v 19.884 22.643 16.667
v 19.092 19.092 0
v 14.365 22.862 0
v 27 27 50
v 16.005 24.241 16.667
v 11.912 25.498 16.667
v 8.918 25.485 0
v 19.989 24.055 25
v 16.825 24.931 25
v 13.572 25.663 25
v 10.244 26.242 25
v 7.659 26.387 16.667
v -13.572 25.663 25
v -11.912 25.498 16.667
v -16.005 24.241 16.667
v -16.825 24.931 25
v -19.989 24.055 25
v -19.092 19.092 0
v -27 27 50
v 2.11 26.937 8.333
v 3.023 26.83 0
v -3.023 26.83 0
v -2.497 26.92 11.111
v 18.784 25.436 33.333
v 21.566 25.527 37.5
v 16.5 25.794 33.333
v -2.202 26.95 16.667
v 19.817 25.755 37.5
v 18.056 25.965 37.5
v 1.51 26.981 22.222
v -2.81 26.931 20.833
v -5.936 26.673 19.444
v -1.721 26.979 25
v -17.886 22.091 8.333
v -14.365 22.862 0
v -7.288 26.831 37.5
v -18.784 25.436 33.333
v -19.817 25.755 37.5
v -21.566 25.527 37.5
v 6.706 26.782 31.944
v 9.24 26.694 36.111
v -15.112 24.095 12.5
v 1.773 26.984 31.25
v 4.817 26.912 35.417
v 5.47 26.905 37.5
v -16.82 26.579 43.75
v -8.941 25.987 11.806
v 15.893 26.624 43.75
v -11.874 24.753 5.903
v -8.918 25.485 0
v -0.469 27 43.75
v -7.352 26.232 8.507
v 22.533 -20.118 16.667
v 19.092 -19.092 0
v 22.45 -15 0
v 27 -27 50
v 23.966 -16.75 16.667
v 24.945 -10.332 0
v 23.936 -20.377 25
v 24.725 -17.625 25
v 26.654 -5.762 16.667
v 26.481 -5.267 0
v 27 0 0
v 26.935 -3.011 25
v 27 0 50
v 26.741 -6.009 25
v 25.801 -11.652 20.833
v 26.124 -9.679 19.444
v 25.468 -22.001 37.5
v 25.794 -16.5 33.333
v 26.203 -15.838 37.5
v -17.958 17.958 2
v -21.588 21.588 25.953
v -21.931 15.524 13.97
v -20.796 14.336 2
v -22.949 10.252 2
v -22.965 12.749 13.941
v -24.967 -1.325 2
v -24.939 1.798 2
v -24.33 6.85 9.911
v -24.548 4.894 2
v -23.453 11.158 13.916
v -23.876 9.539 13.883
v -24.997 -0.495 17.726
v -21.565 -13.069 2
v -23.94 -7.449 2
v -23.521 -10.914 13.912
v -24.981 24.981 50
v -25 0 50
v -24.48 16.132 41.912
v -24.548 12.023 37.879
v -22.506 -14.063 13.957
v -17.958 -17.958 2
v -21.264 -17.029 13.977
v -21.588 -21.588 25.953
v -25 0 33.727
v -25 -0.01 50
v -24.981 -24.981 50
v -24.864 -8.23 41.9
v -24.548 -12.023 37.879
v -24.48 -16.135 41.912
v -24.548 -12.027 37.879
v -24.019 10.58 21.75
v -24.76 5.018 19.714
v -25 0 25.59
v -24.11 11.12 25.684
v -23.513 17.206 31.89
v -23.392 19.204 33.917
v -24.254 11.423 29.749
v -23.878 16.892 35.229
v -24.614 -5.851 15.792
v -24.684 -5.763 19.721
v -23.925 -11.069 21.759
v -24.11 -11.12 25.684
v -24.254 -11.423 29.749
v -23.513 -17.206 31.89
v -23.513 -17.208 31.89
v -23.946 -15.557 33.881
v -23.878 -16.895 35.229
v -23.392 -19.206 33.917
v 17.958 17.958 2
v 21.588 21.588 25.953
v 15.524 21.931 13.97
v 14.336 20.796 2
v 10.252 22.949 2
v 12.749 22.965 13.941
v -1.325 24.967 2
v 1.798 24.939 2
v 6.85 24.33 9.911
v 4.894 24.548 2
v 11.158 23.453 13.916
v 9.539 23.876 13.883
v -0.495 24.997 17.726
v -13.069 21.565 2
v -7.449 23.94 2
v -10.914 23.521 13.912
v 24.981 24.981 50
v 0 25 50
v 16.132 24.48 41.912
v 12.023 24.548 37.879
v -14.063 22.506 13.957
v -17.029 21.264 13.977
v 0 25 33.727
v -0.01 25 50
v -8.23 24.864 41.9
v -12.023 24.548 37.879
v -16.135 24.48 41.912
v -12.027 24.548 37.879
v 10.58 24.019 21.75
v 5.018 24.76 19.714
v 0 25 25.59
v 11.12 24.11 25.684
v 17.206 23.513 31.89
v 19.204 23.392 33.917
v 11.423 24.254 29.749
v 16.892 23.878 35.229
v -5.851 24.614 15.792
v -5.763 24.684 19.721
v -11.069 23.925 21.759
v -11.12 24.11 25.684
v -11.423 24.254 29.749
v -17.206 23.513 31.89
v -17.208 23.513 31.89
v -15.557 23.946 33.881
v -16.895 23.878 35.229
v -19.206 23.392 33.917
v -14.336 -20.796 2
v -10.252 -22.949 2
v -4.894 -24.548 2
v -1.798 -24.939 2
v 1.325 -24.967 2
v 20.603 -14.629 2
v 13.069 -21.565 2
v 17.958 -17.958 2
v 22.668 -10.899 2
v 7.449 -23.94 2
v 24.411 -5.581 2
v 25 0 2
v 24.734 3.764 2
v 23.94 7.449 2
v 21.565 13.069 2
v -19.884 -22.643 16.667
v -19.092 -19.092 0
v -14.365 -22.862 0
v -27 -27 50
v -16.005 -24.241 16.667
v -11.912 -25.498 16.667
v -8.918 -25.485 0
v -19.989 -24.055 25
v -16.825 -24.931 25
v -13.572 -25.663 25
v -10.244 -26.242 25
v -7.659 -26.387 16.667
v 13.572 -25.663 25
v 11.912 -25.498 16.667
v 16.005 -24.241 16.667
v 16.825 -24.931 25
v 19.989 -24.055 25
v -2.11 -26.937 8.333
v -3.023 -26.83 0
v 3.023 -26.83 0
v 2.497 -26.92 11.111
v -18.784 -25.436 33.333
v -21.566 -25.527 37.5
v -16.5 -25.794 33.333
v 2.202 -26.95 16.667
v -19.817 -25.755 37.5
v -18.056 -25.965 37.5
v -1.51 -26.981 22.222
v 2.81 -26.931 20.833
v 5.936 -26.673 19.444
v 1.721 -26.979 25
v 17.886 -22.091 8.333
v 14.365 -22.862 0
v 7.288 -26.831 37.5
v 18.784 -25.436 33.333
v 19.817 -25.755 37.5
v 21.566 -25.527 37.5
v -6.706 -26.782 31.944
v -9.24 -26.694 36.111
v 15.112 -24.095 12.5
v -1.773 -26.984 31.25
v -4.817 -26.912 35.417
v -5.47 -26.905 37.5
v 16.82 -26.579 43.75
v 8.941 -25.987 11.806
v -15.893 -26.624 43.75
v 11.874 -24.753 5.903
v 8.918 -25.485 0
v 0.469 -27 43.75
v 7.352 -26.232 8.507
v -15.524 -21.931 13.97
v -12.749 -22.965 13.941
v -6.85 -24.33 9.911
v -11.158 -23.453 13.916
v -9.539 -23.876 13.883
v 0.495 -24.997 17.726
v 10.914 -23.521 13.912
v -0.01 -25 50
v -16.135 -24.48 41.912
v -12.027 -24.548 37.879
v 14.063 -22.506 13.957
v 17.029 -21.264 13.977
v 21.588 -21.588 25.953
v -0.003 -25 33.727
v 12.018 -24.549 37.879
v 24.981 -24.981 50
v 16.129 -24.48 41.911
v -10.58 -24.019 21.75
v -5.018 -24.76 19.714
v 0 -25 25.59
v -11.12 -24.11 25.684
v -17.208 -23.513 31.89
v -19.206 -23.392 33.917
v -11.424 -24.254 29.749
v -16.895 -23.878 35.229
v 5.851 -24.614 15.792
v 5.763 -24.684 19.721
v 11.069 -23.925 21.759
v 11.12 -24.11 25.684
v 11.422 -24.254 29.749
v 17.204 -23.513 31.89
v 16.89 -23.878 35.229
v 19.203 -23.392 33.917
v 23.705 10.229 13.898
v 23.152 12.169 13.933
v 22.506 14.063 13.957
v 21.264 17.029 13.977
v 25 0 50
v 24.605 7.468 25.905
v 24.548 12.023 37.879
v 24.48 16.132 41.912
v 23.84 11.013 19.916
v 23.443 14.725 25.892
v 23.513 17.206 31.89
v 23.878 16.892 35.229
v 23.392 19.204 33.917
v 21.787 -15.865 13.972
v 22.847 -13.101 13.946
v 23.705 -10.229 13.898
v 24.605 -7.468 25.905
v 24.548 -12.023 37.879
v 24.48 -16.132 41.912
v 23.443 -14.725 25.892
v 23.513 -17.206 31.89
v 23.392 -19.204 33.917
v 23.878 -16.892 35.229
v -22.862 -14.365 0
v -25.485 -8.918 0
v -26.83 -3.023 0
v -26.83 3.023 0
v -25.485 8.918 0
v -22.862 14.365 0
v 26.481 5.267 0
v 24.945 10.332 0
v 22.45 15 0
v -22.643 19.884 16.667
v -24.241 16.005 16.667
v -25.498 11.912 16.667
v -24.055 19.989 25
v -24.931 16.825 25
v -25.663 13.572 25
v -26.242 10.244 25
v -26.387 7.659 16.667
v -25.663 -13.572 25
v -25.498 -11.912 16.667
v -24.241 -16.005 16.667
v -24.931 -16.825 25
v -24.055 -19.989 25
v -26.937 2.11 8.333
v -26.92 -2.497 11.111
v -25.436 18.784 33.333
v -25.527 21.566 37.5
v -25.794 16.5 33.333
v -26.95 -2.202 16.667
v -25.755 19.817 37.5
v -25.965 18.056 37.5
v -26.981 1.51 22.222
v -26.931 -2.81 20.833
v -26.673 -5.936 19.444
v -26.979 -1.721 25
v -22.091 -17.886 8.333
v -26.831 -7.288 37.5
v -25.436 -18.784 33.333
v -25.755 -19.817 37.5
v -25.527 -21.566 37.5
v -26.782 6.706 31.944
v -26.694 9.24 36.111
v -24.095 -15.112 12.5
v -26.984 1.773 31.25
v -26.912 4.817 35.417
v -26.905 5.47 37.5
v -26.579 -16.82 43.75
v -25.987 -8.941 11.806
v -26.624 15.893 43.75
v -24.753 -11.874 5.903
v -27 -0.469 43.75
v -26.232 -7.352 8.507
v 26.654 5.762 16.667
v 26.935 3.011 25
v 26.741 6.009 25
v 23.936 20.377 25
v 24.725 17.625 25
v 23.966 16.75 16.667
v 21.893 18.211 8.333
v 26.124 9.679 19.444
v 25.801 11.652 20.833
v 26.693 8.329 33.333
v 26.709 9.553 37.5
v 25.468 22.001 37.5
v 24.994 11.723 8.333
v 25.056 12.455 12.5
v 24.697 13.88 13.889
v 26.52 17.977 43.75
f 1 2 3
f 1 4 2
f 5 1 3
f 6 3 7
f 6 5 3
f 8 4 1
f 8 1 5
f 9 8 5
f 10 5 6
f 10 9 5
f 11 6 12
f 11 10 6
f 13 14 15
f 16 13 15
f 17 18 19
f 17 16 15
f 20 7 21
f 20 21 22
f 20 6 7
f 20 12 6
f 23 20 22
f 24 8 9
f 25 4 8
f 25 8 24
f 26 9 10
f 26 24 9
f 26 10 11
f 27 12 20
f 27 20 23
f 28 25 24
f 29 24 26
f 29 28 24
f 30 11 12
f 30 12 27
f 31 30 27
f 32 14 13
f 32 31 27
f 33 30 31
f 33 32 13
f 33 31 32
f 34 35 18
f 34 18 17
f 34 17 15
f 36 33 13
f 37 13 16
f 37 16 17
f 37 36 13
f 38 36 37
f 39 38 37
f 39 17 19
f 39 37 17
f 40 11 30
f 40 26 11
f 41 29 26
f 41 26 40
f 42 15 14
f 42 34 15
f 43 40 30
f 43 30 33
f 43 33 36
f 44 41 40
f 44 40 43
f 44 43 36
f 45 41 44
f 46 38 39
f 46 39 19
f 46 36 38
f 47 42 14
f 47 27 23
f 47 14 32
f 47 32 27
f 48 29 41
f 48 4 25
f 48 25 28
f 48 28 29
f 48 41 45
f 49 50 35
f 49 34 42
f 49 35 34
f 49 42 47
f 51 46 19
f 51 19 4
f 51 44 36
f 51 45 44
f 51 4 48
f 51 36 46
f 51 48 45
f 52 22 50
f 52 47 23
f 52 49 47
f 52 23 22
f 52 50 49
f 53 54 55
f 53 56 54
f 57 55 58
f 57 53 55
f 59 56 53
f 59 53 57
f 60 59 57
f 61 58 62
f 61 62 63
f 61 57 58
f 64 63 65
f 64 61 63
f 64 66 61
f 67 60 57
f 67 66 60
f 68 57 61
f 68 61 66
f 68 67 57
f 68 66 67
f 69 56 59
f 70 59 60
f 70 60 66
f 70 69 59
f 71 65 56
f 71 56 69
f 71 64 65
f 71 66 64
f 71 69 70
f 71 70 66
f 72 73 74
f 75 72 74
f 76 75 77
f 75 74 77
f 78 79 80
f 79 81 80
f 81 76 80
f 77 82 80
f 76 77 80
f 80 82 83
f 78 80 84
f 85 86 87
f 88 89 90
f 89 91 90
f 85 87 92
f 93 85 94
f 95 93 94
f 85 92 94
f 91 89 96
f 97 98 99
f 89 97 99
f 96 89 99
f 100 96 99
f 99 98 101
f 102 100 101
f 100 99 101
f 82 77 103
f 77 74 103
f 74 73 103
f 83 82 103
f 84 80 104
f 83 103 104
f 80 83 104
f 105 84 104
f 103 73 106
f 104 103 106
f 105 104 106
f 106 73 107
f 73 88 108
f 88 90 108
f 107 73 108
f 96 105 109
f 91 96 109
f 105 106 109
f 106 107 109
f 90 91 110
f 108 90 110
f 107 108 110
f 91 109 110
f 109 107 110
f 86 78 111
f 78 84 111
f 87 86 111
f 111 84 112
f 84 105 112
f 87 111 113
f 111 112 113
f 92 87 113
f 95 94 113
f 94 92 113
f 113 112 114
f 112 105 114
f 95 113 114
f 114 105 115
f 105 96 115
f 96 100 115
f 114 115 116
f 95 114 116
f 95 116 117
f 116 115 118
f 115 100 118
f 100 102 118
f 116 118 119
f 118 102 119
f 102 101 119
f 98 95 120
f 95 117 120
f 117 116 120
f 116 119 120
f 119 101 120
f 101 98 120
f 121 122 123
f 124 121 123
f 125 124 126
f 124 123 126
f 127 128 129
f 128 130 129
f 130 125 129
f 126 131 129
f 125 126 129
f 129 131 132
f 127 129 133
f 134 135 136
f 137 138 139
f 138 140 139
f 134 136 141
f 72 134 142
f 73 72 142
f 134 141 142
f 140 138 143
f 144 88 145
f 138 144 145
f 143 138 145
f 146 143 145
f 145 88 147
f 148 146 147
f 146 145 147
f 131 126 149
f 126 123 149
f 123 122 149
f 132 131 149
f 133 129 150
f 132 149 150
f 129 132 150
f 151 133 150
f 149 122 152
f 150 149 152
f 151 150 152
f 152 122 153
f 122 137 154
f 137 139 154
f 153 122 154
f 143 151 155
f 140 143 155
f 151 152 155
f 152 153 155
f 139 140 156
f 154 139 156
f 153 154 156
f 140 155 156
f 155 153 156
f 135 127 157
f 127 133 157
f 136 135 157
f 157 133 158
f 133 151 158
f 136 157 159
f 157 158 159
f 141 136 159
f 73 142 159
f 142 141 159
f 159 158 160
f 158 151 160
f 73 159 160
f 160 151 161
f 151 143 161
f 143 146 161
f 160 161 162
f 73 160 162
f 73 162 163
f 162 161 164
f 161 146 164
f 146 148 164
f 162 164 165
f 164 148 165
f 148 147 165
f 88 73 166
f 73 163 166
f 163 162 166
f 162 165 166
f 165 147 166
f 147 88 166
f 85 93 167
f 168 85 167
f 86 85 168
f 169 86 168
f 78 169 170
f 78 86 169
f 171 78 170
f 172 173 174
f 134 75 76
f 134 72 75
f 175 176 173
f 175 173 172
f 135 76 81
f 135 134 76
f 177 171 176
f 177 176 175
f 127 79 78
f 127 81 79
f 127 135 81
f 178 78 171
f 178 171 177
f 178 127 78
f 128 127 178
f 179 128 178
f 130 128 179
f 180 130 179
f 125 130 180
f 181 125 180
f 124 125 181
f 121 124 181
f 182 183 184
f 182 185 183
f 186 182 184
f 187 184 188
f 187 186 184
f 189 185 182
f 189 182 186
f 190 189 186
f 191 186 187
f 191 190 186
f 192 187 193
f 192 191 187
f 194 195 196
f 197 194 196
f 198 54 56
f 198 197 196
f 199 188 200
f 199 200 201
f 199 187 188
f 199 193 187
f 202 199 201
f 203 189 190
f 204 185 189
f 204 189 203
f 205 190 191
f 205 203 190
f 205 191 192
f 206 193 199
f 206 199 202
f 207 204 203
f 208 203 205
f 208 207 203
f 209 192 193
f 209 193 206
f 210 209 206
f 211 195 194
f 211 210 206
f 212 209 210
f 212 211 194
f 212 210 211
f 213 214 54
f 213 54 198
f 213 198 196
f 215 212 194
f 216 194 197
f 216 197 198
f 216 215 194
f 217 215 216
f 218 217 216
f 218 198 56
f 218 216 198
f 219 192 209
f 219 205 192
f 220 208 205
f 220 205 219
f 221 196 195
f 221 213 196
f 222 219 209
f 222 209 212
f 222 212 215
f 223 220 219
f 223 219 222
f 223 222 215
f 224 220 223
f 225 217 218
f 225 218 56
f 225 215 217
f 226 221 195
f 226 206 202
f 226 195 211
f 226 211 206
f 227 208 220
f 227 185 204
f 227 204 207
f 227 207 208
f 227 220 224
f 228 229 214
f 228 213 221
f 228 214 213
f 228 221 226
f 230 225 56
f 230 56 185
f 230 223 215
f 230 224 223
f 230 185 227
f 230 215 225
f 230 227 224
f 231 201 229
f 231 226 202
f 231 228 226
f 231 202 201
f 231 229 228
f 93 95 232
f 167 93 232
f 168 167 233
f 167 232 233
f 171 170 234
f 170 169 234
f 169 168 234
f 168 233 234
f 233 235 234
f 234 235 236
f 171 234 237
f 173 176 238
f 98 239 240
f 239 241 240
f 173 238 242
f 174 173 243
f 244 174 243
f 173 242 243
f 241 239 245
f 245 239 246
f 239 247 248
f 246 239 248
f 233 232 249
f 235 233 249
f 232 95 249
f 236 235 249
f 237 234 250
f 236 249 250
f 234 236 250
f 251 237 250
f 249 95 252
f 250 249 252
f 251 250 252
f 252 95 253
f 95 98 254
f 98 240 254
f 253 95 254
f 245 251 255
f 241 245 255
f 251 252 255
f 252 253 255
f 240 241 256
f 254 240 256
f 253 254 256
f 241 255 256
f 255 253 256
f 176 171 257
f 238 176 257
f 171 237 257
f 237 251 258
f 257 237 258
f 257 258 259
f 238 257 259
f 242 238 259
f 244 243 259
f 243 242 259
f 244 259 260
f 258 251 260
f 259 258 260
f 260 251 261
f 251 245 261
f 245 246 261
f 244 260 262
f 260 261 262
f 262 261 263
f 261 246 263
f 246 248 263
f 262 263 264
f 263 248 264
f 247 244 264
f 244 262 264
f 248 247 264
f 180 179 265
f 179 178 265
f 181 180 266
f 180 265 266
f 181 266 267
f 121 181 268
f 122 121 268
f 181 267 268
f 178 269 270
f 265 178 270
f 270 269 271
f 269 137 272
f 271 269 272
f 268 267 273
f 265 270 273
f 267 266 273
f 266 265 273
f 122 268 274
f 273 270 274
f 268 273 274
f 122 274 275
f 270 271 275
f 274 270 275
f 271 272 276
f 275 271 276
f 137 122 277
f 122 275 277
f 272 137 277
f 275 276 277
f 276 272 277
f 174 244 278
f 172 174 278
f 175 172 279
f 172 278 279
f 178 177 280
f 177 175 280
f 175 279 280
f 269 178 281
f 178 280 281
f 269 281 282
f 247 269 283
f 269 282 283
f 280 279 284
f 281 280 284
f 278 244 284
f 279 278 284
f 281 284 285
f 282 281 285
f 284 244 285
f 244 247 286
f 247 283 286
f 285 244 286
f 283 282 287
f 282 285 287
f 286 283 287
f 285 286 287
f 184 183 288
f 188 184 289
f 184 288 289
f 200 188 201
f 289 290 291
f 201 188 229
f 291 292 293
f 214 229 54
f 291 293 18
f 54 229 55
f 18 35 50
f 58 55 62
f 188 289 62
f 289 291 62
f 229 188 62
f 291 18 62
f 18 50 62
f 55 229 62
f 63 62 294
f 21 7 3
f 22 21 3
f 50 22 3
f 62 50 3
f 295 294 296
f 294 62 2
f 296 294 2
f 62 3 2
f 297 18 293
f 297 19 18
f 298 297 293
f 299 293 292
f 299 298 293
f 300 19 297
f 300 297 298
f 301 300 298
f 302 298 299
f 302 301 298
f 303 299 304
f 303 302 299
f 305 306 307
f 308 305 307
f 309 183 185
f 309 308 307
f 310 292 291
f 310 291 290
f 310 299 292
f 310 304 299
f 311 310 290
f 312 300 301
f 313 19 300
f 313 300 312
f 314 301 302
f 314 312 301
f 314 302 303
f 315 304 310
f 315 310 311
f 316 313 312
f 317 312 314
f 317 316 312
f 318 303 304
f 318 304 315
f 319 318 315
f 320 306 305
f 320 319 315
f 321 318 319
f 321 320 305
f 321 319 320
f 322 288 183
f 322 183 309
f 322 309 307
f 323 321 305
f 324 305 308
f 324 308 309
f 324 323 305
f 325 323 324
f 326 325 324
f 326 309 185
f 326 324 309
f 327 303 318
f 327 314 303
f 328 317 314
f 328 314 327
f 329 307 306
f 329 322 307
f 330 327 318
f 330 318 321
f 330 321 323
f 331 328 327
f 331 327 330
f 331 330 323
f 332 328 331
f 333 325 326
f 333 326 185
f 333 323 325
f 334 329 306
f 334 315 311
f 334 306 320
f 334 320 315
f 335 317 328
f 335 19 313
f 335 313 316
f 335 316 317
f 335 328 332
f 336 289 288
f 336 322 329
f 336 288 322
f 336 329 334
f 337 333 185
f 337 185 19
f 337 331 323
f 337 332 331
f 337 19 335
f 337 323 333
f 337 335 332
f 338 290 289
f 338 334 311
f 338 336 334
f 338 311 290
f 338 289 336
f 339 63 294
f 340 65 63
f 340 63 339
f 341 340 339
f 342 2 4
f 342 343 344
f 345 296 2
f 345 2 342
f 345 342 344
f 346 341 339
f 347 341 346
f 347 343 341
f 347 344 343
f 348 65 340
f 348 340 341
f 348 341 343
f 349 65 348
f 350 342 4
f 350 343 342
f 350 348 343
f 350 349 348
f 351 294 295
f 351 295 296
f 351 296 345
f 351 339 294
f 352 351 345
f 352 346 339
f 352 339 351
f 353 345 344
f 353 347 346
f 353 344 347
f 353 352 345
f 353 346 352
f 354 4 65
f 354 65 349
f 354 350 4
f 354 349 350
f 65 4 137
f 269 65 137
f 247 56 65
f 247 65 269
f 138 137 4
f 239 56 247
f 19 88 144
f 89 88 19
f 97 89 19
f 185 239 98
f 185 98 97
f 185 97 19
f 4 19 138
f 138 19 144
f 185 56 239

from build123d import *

# Parameters (mm, degrees)
F0_R = 27
F2_W = 54
F2_H = 54
F4_T = 2


# Not quite as in the source:
# - a shell that OpenCascade refuses in one call is made with other operations: the cavity is built on its own and cut out


with BuildPart() as f3:
    # F0 (on Top) → F3 section 0
    with BuildSketch(Plane.XY):
        Circle(F0_R)
    # F2 (on offset) → F3 section 1
    with BuildSketch(Plane.XY.offset(50)):
        Rectangle(F2_W, F2_H)
    loft()

    # F4: shell of thickness 2, made by hand


with BuildPart() as f4_core1:
    # F4_t2: copy of F3
    add(f3.part)

    # the walls: a layer under each face that stays
    f4_faces = [f4_core1.faces().sort_by_distance(p)[0] for p in [
        (25.9723736862, 11.9162263358, 25),
        (0, 26.999999999, 25),
        (-26.999999999, 0, 25),
        (0, -26.999999999, 25),
        (25.9723736862, -11.9162263358, 25),
        (0, 0, 0),
    ]]
    thicken(f4_faces, amount=-F4_T, mode=Mode.SUBTRACT)


with BuildPart() as f3_1:
    add(f3.part)

    # what is left inside the walls is the cavity
    f4_cavity = [f4_core1.part.solids().sort_by_distance(p)[0] for p in [
        (4.996272, 9.992544, 49.98),
    ]]
    add(f4_cavity, mode=Mode.SUBTRACT)


solid = f3_1.part
